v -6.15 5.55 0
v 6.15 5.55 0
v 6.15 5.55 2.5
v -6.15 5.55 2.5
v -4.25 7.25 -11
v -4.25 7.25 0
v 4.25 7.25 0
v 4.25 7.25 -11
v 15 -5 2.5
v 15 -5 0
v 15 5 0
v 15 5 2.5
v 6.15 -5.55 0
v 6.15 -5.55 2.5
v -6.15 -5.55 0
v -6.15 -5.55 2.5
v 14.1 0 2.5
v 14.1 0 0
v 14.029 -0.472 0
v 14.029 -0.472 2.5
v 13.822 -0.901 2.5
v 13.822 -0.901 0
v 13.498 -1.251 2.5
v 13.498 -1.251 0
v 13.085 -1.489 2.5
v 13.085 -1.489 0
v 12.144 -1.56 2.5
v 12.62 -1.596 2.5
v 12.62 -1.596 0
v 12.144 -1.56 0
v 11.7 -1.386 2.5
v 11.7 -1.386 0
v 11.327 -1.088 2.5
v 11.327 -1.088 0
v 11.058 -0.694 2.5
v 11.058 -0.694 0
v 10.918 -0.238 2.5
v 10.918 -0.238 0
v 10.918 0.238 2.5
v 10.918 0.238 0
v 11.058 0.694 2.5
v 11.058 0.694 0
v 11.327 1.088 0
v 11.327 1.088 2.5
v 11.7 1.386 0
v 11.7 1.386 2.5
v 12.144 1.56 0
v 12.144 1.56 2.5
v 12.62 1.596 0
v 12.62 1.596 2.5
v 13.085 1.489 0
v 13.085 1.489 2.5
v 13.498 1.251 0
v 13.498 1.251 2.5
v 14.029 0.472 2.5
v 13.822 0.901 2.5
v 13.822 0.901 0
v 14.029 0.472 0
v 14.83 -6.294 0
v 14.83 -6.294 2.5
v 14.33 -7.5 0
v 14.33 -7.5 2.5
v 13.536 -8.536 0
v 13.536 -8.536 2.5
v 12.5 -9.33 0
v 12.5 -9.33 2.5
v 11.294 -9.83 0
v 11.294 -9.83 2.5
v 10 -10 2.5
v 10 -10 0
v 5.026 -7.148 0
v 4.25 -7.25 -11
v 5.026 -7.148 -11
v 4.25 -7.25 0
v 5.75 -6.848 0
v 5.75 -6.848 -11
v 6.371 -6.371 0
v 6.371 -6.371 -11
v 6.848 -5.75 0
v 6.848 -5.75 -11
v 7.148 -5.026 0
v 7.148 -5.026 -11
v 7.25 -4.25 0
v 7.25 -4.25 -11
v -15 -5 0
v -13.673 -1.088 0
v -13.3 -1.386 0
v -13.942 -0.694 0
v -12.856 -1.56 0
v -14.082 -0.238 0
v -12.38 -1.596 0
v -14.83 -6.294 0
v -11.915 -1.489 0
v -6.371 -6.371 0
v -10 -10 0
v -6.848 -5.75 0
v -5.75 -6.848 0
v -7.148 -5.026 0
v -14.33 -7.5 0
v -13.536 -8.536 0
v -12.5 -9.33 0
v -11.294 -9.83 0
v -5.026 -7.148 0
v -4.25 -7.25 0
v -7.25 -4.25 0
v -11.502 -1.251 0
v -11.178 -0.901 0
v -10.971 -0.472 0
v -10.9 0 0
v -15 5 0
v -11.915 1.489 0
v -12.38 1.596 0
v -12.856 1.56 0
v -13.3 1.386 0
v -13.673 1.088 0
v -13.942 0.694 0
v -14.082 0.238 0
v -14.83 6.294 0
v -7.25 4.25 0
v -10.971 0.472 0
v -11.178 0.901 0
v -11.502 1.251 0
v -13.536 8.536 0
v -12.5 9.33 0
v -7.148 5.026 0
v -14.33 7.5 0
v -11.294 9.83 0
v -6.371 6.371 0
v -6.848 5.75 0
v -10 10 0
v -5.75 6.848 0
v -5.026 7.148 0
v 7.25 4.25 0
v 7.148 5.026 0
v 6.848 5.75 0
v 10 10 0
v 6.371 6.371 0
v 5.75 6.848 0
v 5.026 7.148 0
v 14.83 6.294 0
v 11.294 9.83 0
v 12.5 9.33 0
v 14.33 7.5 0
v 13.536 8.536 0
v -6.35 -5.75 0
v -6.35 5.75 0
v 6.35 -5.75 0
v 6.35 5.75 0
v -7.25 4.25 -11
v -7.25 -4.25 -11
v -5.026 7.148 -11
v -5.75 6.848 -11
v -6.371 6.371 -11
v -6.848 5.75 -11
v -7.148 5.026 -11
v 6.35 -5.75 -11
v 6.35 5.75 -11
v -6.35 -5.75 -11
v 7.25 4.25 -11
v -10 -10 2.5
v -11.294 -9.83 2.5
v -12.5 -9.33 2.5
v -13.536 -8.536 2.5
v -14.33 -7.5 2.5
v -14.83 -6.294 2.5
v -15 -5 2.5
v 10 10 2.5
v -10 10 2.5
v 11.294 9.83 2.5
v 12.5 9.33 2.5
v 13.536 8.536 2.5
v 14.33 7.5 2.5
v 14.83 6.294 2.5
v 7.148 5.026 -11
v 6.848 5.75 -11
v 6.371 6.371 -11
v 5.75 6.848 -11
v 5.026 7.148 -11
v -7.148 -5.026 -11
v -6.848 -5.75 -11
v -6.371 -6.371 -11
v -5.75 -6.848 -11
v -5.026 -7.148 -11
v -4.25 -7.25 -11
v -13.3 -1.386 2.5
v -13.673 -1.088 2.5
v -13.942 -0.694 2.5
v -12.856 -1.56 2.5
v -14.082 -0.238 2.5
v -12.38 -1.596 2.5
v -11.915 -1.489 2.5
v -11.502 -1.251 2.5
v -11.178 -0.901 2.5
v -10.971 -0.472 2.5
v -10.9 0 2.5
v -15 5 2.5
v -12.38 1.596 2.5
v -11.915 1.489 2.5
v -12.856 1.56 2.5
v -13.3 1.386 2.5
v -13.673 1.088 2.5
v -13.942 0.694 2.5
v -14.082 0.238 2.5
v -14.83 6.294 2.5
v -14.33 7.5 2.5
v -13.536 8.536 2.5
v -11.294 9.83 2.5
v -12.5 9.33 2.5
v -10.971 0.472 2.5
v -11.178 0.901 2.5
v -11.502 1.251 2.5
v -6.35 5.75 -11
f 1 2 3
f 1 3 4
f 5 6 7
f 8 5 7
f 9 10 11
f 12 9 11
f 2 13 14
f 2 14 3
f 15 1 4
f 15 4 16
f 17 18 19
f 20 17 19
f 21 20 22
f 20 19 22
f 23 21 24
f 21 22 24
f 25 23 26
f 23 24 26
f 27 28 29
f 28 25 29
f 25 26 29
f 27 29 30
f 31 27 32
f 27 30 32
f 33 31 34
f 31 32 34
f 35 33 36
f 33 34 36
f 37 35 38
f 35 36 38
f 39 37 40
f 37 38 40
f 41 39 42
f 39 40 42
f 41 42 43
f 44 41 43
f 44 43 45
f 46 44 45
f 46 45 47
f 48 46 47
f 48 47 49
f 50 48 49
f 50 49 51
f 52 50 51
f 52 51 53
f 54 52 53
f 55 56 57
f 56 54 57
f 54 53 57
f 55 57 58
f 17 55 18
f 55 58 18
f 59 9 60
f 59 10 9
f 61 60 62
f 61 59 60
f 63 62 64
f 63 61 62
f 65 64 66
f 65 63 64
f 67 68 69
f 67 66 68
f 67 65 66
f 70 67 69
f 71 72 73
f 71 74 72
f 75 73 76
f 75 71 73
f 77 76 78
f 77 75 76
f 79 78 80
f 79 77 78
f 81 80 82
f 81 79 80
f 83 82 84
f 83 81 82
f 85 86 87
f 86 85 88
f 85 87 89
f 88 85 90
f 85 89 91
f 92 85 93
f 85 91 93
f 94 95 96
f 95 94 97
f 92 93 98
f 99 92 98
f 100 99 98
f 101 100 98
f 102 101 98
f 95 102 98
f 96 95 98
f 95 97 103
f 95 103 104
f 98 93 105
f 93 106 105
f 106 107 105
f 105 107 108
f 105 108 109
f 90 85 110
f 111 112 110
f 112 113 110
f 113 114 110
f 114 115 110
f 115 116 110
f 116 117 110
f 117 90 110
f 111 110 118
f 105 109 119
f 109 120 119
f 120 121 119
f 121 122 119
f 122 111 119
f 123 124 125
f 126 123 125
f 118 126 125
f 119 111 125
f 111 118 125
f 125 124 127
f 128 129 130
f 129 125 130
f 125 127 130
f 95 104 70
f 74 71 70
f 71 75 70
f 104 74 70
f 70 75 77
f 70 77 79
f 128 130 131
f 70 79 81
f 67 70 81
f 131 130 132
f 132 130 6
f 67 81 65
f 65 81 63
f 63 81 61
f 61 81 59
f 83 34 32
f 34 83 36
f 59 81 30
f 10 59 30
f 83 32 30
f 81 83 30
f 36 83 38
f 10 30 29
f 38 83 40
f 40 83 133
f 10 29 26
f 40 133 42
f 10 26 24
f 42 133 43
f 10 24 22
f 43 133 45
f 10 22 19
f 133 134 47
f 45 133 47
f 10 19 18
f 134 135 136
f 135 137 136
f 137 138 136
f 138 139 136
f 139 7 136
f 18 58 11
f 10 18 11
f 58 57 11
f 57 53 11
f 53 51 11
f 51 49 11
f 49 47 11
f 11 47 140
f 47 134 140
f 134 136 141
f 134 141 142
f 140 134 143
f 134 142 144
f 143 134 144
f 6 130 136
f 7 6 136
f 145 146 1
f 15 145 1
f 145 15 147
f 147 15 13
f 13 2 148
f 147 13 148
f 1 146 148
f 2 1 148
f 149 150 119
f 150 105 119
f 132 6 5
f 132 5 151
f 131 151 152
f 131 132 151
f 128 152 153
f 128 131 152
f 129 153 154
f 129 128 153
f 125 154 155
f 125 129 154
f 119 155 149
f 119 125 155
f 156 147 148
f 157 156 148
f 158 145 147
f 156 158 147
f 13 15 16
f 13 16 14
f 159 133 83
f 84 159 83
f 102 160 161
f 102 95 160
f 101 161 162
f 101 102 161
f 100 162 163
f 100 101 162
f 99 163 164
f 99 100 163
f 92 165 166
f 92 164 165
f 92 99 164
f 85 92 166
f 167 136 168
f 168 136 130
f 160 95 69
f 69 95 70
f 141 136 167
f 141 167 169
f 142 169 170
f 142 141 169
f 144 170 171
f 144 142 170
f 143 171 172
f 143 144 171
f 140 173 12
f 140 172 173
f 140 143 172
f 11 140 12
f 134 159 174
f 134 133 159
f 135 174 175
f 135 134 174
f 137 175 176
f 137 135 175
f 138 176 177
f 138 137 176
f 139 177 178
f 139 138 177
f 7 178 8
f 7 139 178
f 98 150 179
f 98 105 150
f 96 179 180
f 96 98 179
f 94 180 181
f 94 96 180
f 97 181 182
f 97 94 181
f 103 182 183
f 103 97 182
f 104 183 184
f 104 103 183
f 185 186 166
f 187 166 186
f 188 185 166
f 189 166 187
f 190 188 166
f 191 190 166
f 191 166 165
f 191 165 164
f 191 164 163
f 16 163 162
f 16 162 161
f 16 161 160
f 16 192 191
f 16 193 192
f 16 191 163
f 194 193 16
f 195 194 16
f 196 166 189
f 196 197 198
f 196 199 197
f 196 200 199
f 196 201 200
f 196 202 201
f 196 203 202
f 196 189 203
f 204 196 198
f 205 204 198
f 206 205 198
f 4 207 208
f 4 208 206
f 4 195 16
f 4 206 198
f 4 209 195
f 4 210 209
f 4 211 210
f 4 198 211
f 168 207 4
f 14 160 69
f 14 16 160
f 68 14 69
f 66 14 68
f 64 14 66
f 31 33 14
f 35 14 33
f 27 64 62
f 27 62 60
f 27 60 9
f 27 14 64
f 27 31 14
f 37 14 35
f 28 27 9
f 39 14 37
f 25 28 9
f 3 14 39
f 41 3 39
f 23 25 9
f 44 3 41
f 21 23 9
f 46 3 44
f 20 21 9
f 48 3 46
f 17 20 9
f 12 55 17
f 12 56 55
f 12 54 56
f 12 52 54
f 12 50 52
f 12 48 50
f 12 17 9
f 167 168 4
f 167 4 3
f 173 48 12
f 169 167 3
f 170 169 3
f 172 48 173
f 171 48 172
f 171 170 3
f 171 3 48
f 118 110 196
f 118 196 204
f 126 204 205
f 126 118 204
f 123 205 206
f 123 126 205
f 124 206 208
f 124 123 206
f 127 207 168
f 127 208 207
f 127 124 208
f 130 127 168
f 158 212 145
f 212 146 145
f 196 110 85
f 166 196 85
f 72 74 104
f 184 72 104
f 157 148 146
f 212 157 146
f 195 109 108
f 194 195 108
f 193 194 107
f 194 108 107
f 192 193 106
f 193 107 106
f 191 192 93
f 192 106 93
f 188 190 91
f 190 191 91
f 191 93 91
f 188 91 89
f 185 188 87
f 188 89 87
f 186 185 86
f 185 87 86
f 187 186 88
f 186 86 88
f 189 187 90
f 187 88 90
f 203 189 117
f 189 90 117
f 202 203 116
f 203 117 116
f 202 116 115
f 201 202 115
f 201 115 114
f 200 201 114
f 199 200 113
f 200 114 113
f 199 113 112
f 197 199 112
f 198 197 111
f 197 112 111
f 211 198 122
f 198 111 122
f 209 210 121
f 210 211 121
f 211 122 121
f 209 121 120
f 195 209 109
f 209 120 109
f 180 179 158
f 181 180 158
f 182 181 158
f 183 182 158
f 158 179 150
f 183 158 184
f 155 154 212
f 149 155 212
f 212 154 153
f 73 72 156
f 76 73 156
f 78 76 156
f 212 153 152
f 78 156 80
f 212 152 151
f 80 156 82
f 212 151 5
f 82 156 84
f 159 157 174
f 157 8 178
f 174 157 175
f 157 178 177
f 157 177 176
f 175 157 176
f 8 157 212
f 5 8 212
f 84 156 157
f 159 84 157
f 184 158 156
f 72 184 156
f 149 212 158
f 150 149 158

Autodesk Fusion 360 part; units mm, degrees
sketch "Sketch1" plane through (0, 0, 0) normal (0, 0, 1) x (1, 0, 0)
  line L0 (-4.25, 7.25) -> (4.25, 7.25)
  line L1 (7.25, 4.25) -> (7.25, -4.25)
  line L2 (4.25, -7.25) -> (-4.25, -7.25)
  line L3 (-7.25, -4.25) -> (-7.25, 4.25)
  line L4 (-7.25, 7.25) -> (7.25, -7.25) construction
  line L5 (7.25, 7.25) -> (-7.25, -7.25) construction
  arc A0 (-4.25, 7.25) -> (-7.25, 4.25) centre (-4.25, 4.25) ccw
  arc A1 (-7.25, -4.25) -> (-4.25, -7.25) centre (-4.25, -4.25) ccw
  arc A2 (4.25, -7.25) -> (7.25, -4.25) centre (4.25, -4.25) ccw
  arc A3 (7.25, 4.25) -> (4.25, 7.25) centre (4.25, 4.25) ccw
  line L6 (10, 10) -> (-10, 10)
  line L7 (-15, 5) -> (-15, -5)
  line L8 (-10, -10) -> (10, -10)
  line L9 (15, -5) -> (15, 5)
  line L10 (15, 10) -> (-15, -10) construction
  line L11 (-15, 10) -> (15, -10) construction
  arc A4 (15, 5) -> (10, 10) centre (10, 5) ccw
  arc A5 (-10, 10) -> (-15, 5) centre (-10, 5) ccw
  arc A6 (-15, -5) -> (-10, -10) centre (-10, -5) ccw
  arc A7 (10, -10) -> (15, -5) centre (10, -5) ccw
  circle A8 centre (-12.5, 0) radius 1.6
  line L12 (0, 0) -> (0, 5.6259) construction
  circle A9 centre (12.5, 0) radius 1.6
  line L13 (-3, 4.4279) -> (-3, -3.4951) construction
  line L14 (6.15, 5.55) -> (-6.15, 5.55)
  line L15 (-6.15, 5.55) -> (-6.15, -5.55)
  line L16 (-6.15, -5.55) -> (6.15, -5.55)
  line L17 (6.15, -5.55) -> (6.15, 5.55)
  line L18 (6.15, 5.55) -> (-6.15, -5.55) construction
  line L19 (-6.15, 5.55) -> (6.15, -5.55) construction
  line L20 (-6.35, -5.75) -> (6.35, -5.75)
  line L21 (6.35, -5.75) -> (6.35, 5.75)
  line L22 (6.35, 5.75) -> (-6.35, 5.75)
  line L23 (-6.35, 5.75) -> (-6.35, -5.75)
  dimension "d1" = 14.5
  dimension "d2" = 14.5
  dimension "d3" = 3
  dimension "d4" = 30
  dimension "d5" = 20
  dimension "d6" = 5
  dimension "d7" = 3.2
  dimension "d17" = 12.5
  dimension "d21" = 12.3
  dimension "d22" = 11.1
  dimension "d23" = 0.2
extrude "Extrude1" add sketch "Sketch1" along normal blind 2.5 contours L0 L1 L2 L3 A0 A1 A2 A3 | L6 L7 L8 L9 A4 A5 A6 A7 | L20 L21 L22 L23
extrude "Extrude2" add sketch "Sketch1" against normal blind 11 contours L0 L1 L2 L3 A0 A1 A2 A3
